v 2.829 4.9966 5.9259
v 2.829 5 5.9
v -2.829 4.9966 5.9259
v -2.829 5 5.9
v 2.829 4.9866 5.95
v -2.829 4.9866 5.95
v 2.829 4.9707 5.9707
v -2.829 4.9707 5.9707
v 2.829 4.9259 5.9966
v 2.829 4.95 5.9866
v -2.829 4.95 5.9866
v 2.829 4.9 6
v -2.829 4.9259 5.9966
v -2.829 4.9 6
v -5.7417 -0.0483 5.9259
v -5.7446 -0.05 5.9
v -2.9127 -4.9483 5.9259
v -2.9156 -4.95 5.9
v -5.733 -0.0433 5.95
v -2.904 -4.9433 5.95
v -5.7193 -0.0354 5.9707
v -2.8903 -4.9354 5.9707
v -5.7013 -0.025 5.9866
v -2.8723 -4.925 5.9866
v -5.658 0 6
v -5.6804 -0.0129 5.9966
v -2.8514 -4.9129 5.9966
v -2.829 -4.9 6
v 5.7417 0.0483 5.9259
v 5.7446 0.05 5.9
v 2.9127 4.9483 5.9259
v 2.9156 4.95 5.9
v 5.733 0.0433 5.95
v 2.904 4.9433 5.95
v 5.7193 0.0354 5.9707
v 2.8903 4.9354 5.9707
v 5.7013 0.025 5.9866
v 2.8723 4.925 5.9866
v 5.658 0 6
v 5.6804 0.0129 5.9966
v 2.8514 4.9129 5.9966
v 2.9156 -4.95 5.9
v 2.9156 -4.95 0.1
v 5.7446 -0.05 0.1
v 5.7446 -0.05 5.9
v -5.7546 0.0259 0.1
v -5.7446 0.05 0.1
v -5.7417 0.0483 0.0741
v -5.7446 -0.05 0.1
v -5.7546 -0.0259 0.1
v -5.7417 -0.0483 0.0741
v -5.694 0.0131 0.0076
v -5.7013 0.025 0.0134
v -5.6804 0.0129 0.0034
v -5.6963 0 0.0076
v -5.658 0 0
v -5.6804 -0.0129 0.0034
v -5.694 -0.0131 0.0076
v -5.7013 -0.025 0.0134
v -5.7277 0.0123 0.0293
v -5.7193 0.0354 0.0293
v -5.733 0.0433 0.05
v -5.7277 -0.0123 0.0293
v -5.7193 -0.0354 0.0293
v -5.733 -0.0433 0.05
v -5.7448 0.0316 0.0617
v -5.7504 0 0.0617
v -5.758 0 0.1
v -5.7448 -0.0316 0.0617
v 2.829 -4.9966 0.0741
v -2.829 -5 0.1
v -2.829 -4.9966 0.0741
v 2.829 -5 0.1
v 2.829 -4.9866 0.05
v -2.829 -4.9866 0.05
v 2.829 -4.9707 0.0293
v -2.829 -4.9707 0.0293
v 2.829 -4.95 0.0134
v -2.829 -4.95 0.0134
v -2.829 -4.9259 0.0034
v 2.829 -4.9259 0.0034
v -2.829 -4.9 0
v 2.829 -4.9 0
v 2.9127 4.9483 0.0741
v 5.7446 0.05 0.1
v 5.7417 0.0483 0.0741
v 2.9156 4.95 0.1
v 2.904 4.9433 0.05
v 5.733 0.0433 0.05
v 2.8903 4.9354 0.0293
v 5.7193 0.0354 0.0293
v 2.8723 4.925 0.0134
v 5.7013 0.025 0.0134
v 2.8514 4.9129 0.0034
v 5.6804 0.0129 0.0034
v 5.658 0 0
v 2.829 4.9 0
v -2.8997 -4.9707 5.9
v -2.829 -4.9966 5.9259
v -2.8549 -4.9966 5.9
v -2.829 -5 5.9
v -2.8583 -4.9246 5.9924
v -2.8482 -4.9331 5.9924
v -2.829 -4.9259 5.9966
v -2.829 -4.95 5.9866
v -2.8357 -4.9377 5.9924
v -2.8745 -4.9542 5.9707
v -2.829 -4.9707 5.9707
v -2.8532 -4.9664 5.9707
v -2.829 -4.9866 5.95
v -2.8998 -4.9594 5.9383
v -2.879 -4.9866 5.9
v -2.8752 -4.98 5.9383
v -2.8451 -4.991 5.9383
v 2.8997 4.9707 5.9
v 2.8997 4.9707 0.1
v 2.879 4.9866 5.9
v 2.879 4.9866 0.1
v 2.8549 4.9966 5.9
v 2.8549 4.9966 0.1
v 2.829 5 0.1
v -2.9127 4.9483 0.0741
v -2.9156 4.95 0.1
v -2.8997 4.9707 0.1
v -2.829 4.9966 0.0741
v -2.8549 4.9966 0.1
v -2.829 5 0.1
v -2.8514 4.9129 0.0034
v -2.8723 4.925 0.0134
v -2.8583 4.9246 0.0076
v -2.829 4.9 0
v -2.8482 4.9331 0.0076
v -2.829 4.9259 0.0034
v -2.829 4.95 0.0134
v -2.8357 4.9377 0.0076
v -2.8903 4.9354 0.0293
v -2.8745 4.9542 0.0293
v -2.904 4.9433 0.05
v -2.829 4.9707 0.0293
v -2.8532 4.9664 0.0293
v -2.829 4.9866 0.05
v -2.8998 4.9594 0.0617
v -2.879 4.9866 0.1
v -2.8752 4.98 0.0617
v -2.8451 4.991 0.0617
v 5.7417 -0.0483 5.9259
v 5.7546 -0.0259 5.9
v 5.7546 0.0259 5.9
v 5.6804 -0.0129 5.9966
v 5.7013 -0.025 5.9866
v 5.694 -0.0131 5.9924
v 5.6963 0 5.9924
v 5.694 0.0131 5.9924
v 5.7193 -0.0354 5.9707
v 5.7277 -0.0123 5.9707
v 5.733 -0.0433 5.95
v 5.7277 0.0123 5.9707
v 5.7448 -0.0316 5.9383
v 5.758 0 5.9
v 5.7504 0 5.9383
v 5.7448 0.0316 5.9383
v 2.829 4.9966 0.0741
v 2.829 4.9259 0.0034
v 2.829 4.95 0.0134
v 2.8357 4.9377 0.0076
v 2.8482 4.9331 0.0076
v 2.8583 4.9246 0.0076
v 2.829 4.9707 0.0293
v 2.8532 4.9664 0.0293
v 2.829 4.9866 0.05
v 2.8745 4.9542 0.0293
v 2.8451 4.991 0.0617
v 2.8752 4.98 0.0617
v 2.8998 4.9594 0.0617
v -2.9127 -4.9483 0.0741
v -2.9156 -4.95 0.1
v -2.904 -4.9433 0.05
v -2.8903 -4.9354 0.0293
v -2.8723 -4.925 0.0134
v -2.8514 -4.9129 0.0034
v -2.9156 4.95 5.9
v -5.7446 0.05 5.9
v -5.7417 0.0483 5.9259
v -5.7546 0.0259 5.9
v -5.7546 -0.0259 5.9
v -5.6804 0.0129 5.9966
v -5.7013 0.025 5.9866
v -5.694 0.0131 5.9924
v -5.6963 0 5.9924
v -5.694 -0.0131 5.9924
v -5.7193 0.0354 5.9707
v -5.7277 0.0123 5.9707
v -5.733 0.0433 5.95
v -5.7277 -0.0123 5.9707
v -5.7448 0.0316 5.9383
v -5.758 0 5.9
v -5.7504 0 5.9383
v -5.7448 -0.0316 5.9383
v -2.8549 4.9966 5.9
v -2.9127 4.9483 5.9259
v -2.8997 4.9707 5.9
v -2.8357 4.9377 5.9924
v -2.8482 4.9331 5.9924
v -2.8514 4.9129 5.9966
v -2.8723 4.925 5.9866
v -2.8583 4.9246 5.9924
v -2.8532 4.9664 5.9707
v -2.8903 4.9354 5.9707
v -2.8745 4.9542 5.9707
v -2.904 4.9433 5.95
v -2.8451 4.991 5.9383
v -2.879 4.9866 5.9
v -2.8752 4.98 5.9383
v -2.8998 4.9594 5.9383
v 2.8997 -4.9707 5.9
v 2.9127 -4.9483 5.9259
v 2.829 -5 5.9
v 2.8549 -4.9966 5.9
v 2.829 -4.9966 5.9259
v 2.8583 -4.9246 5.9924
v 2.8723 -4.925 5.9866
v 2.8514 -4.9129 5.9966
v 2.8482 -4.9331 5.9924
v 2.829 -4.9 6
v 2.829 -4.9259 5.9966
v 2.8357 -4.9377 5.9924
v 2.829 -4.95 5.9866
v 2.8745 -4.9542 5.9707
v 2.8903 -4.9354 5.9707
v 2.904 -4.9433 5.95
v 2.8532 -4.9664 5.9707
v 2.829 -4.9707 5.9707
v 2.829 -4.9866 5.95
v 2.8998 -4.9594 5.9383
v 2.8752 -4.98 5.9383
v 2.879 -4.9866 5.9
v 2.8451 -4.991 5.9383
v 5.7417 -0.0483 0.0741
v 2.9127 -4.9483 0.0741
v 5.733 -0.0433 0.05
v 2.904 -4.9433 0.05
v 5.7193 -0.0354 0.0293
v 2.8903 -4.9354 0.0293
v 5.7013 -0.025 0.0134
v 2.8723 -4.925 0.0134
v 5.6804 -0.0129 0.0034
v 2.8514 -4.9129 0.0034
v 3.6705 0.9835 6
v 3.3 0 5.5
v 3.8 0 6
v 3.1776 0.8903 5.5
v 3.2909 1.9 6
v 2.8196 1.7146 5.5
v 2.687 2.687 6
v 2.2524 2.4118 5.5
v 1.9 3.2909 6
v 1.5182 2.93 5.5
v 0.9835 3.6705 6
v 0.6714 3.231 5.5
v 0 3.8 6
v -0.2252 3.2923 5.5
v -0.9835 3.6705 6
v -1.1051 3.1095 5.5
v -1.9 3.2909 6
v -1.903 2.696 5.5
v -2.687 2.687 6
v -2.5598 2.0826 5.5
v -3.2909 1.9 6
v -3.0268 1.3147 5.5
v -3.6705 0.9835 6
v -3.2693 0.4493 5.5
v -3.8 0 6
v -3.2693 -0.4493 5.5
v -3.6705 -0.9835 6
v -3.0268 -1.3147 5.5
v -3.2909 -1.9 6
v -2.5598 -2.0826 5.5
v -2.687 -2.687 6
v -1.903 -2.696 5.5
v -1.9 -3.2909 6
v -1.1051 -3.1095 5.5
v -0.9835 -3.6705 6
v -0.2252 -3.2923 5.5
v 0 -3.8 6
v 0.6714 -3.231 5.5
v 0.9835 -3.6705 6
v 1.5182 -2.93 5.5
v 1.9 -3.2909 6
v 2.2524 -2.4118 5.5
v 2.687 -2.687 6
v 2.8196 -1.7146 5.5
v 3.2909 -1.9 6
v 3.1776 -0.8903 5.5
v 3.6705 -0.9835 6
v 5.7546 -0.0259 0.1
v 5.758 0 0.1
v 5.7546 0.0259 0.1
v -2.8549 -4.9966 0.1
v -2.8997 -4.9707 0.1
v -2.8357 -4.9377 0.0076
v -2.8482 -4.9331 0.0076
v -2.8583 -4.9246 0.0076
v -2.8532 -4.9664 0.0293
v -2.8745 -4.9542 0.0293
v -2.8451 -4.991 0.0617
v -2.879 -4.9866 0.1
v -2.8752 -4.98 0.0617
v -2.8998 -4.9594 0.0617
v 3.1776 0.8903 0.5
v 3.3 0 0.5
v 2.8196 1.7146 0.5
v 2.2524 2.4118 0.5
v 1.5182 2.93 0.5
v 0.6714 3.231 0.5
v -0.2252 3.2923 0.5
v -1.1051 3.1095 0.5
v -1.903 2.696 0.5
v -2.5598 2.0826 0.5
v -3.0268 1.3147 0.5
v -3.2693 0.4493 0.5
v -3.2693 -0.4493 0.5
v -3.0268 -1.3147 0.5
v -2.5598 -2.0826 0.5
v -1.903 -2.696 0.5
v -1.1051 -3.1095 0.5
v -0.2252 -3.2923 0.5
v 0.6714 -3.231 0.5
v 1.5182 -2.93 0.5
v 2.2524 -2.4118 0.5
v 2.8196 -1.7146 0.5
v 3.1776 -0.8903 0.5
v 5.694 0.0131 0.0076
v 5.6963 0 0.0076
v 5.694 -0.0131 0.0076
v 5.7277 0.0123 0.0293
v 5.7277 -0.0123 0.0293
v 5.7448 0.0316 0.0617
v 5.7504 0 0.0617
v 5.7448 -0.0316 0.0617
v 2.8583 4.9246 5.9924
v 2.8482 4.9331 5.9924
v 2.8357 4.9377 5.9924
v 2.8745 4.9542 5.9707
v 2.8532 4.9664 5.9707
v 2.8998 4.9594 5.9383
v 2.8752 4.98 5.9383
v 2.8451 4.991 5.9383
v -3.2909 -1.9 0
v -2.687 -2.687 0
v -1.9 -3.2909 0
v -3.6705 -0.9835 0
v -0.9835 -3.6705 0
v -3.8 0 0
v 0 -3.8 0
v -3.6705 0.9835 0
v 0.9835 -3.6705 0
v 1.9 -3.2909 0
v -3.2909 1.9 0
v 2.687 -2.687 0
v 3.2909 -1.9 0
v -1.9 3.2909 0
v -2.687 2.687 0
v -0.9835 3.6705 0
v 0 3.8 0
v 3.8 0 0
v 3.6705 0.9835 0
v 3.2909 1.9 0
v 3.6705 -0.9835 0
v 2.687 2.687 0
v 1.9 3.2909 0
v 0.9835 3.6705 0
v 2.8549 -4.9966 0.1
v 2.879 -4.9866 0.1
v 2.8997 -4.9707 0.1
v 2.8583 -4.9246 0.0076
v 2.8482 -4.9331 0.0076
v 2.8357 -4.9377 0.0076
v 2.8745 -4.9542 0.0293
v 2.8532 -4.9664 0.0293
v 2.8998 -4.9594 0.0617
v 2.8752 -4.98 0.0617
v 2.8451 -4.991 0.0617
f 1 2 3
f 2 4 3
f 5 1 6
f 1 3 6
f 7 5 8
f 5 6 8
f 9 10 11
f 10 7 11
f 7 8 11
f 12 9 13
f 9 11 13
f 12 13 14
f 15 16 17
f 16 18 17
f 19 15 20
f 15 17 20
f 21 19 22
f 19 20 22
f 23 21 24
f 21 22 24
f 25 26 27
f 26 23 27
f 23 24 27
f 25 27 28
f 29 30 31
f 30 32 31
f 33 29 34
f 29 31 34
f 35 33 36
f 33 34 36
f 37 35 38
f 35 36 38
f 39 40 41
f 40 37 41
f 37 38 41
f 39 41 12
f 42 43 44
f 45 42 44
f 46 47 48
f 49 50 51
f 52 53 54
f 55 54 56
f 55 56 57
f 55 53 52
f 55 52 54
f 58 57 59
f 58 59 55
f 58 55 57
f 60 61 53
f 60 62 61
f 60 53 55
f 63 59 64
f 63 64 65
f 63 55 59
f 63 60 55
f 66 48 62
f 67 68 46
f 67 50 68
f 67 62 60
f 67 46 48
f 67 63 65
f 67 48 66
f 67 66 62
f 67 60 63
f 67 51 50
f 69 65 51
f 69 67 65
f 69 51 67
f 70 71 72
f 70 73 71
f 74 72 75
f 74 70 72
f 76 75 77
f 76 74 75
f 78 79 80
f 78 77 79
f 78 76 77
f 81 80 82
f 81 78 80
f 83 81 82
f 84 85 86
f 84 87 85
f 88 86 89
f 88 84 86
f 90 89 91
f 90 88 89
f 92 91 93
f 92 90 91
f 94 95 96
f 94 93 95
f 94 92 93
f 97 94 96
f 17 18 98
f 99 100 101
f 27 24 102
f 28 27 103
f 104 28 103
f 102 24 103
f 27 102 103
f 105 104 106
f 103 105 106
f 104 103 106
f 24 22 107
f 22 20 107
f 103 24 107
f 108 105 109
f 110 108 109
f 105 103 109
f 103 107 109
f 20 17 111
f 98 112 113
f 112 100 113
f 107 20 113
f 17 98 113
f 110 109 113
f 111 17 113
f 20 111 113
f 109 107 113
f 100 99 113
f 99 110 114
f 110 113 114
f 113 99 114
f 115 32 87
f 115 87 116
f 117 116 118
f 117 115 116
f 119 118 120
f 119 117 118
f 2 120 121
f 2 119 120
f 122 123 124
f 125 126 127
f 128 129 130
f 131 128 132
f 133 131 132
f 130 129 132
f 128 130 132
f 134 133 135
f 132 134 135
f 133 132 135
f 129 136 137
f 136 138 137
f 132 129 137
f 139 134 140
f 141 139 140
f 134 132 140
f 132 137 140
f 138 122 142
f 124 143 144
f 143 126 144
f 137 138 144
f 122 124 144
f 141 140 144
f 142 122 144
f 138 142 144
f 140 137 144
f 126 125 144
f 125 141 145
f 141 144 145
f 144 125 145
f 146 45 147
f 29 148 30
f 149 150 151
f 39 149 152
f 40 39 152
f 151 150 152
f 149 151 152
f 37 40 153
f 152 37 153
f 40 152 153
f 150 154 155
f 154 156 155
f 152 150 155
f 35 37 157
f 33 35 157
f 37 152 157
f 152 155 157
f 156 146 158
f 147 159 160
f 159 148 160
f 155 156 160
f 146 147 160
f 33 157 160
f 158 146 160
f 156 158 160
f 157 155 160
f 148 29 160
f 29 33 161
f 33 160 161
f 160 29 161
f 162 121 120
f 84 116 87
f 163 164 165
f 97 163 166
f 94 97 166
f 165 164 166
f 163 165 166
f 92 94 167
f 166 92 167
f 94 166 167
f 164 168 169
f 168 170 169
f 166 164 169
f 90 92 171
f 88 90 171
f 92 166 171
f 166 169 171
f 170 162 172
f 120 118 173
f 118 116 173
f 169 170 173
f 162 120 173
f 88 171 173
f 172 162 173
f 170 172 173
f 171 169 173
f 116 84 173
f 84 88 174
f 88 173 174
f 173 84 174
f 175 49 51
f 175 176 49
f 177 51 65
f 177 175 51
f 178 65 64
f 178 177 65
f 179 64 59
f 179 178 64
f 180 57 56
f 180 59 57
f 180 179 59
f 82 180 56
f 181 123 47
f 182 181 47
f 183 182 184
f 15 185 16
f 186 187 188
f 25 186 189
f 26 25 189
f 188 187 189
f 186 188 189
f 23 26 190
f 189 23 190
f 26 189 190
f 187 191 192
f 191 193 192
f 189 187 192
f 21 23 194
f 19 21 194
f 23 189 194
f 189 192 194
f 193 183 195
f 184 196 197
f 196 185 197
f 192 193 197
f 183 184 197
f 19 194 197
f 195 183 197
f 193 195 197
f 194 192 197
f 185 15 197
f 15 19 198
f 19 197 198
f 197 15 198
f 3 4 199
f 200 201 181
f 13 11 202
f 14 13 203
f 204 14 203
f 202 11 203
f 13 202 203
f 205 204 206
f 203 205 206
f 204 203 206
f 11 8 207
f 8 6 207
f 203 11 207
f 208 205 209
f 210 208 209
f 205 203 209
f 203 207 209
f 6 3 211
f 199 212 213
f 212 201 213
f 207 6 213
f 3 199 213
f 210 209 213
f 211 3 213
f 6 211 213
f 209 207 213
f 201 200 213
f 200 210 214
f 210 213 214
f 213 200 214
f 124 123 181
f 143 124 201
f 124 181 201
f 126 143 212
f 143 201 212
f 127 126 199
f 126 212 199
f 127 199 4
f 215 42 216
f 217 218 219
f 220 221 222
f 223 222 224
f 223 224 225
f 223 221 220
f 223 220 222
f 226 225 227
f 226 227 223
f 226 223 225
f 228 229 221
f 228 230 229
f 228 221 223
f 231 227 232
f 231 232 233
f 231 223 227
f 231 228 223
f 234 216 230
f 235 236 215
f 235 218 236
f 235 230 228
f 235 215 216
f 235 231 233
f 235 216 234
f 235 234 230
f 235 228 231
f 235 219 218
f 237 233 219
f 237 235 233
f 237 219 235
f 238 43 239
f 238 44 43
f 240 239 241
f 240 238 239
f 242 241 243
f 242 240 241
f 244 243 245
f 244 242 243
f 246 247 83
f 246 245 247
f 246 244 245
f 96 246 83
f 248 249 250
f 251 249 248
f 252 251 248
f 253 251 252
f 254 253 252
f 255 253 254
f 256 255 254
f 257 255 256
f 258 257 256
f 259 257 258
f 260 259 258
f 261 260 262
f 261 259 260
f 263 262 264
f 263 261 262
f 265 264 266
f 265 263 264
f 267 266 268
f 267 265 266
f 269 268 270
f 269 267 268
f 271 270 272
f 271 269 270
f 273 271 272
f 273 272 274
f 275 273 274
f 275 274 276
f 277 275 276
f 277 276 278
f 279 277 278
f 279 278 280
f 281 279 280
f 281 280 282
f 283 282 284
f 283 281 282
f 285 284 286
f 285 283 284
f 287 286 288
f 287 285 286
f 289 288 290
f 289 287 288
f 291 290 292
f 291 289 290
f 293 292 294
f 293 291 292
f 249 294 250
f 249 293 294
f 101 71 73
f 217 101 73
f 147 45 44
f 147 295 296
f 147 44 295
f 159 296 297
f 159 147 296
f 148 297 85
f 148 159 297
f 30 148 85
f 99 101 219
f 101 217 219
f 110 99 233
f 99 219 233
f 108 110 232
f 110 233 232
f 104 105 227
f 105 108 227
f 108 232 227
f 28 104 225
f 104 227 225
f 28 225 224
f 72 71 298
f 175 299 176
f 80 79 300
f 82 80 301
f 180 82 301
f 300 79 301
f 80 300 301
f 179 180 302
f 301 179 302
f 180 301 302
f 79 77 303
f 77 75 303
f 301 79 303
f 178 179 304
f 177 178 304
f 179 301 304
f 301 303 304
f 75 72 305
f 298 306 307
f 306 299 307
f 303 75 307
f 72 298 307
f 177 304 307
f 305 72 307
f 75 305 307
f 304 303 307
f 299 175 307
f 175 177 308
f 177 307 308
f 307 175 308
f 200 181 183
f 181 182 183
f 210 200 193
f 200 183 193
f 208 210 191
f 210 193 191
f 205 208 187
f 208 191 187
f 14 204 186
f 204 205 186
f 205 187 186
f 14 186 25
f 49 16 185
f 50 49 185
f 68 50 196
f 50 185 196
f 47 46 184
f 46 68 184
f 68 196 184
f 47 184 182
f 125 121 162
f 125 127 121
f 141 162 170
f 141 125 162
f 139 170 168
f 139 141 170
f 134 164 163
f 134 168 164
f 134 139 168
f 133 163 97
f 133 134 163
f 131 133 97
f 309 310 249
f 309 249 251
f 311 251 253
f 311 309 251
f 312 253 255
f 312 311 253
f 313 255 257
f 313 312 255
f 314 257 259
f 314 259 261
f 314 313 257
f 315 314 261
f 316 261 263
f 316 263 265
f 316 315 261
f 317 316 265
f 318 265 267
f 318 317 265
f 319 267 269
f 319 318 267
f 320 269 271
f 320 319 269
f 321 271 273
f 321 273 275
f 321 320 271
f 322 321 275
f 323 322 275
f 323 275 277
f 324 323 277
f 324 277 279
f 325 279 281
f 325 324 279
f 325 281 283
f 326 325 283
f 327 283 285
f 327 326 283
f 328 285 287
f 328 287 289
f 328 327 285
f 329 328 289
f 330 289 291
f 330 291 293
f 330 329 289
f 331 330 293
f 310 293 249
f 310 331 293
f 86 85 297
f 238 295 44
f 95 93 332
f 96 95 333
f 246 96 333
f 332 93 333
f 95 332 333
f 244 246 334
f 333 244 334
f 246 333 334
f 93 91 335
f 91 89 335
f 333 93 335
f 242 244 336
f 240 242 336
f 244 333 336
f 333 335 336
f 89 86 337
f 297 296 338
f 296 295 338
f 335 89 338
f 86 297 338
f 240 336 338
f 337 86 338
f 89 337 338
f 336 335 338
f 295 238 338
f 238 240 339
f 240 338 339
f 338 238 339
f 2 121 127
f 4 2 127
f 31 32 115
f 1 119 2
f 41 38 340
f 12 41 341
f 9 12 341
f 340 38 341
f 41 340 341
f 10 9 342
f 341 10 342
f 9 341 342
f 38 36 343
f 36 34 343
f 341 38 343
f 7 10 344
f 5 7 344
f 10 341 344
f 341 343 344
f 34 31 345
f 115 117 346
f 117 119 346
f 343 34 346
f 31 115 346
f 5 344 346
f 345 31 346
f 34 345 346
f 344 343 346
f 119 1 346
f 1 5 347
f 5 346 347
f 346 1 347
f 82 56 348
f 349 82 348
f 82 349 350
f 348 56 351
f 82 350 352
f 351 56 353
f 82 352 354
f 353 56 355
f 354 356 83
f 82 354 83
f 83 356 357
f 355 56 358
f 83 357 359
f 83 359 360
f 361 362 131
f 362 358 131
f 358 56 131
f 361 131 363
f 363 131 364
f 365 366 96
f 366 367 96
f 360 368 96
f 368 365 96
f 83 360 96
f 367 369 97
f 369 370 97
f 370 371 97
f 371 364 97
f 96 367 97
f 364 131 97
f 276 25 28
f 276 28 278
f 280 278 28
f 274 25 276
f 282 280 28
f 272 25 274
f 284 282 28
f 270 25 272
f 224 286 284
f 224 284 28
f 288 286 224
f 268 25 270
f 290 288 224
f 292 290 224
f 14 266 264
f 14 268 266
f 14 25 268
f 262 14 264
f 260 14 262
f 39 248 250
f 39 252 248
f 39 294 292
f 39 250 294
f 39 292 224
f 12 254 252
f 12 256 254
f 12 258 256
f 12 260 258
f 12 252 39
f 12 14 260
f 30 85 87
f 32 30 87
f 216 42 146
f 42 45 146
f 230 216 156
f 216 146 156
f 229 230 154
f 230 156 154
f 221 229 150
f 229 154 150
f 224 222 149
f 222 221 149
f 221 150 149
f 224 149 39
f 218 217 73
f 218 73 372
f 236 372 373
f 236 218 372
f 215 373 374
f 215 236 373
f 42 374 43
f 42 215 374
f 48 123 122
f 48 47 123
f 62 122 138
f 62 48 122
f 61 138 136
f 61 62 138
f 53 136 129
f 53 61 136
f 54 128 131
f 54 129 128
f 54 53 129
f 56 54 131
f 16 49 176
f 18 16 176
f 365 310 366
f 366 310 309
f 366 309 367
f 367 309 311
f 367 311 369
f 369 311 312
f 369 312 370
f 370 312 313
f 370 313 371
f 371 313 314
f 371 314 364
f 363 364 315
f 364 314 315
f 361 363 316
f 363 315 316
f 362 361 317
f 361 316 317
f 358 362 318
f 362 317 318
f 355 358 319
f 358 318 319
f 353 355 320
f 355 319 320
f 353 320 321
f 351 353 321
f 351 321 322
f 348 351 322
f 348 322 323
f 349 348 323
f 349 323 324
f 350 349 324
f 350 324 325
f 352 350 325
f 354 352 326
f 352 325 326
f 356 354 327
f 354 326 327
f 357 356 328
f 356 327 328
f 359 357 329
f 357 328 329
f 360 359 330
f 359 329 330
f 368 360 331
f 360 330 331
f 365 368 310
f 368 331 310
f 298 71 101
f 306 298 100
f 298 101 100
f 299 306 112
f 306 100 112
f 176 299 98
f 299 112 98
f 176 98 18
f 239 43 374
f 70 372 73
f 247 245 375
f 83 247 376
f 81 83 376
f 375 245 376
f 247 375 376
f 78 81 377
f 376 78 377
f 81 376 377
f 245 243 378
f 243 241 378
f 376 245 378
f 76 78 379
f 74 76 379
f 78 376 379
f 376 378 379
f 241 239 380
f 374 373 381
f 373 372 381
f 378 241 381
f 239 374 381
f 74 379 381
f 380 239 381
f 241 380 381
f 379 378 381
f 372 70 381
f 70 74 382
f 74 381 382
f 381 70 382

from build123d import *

# Parameters (mm, degrees)
SKETCH1_R           = 3.3
BOSS_EXTRUDE1_DEPTH = 6
FILLET1_R           = 0.1
CHAMFER1_SIZE       = 0.5


with BuildPart() as part:
    # Sketch1 → Boss-Extrude1 (new body)
    with BuildSketch(Plane.XY):
        Polygon((-2.886751346, -5), (2.886751346, -5), (5.773502692, 0), (2.886751346, 5), (-2.886751346, 5), (-5.773502692, 0), align=None)
        Circle(SKETCH1_R, mode=Mode.SUBTRACT)
    extrude(amount=BOSS_EXTRUDE1_DEPTH)

    # Fillet1
    fillet1_edges = [part.edges().sort_by_distance(p)[0] for p in [
        (-5.773502692, 0, 3),
        (-2.886751346, 5, 3),
        (2.886751346, 5, 3),
        (5.773502692, 0, 3),
        (2.886751346, -5, 3),
        (-2.886751346, -5, 3),
        (4.330127019, -2.5, 6),
        (4.330127019, 2.5, 6),
        (0, 5, 6),
        (-4.330127019, 2.5, 6),
        (-4.330127019, -2.5, 6),
        (-4.330127019, 2.5, 0),
        (0, 5, 0),
        (4.330127019, 2.5, 0),
        (4.330127019, -2.5, 0),
        (0, -5, 0),
        (-4.330127019, -2.5, 0),
        (0, -5, 6),
    ]]
    fillet(fillet1_edges, radius=FILLET1_R)

    # Chamfer1
    chamfer1_edges = [part.edges().sort_by_distance(p)[0] for p in [
        (-3.3, 0, 0),
        (-3.3, 0, 6),
    ]]
    chamfer(chamfer1_edges, length=CHAMFER1_SIZE)


solid = part.part
